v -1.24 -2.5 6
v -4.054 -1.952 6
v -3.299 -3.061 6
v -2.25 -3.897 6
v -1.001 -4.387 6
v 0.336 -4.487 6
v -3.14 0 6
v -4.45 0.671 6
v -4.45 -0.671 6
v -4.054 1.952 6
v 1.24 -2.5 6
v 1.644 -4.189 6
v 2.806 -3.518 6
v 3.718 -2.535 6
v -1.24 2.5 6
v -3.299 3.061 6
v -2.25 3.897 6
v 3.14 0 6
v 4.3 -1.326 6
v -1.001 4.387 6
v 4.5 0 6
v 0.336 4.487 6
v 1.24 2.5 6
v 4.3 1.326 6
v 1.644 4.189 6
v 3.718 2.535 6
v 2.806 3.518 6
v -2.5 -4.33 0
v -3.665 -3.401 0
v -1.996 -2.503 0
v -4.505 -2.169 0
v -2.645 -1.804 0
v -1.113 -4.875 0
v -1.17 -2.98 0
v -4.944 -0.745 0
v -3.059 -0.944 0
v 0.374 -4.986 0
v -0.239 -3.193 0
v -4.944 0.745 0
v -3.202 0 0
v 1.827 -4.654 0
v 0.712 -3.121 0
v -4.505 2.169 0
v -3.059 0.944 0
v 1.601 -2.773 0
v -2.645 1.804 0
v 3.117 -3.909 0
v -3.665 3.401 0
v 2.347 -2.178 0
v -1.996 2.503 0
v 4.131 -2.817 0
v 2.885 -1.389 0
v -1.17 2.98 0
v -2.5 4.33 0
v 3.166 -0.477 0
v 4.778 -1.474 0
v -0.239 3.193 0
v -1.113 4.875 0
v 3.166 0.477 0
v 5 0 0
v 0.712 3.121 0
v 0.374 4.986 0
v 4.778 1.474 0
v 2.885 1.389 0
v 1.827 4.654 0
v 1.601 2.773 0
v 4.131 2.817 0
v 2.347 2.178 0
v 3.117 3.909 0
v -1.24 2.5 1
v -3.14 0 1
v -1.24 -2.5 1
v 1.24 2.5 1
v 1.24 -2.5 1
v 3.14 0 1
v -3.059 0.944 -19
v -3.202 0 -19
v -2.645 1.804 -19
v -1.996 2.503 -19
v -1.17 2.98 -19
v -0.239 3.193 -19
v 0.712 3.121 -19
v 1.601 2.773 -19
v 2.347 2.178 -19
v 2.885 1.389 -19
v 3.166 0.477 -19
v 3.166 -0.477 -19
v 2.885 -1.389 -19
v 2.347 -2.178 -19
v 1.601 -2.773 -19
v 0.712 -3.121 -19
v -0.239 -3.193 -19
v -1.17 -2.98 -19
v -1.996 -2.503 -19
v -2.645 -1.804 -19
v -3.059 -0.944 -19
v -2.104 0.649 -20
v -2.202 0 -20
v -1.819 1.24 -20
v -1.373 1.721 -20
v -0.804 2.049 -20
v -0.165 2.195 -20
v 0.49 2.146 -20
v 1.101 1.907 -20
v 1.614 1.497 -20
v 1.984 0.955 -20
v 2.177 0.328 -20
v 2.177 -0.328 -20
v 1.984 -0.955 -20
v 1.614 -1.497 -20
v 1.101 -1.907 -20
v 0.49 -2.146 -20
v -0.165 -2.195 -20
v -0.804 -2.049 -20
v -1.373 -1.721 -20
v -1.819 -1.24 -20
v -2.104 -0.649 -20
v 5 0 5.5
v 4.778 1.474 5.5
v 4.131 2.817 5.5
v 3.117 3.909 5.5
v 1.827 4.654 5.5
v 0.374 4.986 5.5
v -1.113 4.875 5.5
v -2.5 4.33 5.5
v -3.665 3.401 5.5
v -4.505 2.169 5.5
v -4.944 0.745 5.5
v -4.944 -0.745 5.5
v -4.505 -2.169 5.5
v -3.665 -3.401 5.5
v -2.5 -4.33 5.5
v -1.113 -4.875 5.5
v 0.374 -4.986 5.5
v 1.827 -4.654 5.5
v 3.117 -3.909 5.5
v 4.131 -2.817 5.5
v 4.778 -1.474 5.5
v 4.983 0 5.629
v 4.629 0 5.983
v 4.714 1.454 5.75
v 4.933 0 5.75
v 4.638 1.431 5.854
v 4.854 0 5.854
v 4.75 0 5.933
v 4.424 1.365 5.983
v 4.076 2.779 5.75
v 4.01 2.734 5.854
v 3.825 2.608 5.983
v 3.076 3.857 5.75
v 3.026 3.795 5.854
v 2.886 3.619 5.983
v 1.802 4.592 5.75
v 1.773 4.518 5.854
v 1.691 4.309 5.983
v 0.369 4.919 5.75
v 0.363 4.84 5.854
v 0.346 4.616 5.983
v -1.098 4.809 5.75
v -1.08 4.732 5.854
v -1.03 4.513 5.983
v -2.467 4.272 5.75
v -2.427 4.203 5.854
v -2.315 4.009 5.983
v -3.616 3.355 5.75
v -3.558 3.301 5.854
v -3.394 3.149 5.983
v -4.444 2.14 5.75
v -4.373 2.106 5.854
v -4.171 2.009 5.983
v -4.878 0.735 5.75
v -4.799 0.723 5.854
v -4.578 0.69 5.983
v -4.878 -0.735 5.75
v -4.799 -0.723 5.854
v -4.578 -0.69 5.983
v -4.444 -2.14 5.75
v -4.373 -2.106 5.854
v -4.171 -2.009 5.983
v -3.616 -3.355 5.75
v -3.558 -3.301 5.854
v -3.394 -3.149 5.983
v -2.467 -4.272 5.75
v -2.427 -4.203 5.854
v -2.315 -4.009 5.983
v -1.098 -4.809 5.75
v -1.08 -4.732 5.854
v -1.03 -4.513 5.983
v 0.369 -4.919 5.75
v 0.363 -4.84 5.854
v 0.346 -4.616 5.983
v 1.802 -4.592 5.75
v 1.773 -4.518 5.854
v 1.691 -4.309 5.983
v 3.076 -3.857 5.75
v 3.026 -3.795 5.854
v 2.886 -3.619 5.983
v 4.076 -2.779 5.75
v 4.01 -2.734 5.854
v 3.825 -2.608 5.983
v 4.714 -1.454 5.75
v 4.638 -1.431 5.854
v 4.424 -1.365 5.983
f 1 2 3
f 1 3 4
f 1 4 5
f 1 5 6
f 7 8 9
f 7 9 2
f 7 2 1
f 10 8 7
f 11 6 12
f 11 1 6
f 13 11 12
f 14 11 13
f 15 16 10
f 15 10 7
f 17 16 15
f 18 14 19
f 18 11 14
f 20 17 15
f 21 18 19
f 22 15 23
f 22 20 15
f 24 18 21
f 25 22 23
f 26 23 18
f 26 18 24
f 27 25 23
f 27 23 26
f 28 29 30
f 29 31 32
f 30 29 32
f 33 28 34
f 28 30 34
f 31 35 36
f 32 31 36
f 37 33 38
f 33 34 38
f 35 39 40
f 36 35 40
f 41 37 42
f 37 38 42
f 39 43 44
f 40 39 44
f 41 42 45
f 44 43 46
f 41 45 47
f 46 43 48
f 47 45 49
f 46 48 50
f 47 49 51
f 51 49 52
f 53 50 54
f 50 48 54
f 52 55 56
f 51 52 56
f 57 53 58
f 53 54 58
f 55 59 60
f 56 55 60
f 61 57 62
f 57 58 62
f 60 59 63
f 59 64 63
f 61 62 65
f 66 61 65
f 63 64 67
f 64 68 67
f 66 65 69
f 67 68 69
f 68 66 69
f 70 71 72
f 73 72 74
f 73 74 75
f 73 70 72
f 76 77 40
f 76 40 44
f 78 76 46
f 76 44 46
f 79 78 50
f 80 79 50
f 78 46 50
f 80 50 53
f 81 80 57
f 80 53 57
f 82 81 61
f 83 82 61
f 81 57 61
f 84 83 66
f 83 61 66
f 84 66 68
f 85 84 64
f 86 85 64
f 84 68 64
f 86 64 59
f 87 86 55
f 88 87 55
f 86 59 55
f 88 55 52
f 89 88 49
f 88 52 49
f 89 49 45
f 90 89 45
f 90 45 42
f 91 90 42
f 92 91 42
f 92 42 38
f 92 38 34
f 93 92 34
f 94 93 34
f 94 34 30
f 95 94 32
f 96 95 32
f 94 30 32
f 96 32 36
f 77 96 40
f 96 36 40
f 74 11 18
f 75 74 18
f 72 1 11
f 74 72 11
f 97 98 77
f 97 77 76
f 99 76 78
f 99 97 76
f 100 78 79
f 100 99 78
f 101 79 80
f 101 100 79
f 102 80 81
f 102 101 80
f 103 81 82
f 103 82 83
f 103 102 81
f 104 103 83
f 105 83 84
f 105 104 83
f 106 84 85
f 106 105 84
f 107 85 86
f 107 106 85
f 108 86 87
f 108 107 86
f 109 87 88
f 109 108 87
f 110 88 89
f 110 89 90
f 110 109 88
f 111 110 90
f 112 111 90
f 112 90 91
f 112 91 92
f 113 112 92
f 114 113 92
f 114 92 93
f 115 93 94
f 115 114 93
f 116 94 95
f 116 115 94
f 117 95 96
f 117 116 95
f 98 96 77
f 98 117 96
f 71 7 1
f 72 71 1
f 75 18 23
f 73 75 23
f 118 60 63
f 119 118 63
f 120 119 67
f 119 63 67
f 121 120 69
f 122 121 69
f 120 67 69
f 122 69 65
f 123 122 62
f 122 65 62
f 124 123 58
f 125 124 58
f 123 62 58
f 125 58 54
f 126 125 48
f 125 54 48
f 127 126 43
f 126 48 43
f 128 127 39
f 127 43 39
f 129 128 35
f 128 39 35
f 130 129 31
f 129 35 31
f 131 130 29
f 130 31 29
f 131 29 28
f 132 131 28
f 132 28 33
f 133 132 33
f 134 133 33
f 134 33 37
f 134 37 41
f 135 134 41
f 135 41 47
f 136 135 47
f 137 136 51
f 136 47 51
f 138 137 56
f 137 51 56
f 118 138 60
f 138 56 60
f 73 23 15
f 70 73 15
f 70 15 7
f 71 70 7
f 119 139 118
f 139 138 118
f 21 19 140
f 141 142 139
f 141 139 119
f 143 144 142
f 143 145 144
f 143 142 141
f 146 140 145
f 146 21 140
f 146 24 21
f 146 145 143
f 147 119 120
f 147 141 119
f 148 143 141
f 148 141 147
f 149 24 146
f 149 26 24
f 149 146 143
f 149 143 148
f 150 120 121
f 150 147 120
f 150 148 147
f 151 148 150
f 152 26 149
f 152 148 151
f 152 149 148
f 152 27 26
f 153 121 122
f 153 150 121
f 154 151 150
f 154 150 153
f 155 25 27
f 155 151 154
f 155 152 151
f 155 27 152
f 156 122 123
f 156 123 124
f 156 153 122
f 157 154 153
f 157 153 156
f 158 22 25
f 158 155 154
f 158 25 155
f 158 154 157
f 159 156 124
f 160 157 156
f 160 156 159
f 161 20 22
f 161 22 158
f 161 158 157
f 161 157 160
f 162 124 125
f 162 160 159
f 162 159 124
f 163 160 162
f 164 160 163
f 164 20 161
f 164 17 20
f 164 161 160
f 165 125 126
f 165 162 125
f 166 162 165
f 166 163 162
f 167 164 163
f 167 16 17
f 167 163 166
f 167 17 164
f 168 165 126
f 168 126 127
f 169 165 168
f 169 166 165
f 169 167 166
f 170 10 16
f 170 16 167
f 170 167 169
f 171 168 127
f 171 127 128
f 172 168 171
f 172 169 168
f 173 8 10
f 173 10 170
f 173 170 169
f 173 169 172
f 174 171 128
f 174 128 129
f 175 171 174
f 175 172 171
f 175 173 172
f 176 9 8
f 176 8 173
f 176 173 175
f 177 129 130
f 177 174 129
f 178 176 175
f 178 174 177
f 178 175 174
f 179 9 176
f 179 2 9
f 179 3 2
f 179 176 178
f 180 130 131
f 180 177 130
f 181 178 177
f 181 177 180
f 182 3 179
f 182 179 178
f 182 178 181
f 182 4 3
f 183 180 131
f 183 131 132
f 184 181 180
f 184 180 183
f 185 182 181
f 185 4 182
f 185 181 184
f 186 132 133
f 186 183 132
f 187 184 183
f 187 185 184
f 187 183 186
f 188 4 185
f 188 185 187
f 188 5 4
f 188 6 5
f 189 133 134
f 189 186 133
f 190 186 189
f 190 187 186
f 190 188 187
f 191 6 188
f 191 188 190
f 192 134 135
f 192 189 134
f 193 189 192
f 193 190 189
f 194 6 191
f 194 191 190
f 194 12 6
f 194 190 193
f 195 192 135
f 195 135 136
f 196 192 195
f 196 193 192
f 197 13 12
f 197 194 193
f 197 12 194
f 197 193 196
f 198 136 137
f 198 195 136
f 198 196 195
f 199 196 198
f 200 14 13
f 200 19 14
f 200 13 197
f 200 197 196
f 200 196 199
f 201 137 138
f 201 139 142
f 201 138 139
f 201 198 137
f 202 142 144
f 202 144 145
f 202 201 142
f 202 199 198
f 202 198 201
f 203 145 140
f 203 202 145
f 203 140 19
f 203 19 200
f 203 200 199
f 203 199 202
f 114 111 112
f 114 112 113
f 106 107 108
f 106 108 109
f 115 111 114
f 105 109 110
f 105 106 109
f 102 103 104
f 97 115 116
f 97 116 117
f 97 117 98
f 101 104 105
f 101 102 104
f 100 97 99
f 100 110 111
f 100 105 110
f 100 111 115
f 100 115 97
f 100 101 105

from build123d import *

# Parameters (mm, degrees)
ESQUISSE1_R             = 5
BASE_EXTRUSION_DEPTH    = 6
ESQUISSE2_R             = 3.201580403
BOSS_EXTRU_1_DEPTH      = 20
ENL_V_MAT_EXTRU_1_DEPTH = 5
CONG_1_R                = 0.5
CHANFREIN1_SIZE         = 1


with BuildPart() as part:
    # Esquisse1 → Base-Extrusion (new body)
    with BuildSketch(Plane.XY):
        Circle(ESQUISSE1_R)
    extrude(amount=BASE_EXTRUSION_DEPTH)

    # Esquisse2 → Boss.-Extru.1 (add)
    with BuildSketch(Plane(origin=(0, 0, 0), x_dir=(-1, 0, 0), z_dir=(0, 0, -1))):
        Circle(ESQUISSE2_R)
    extrude(amount=BOSS_EXTRU_1_DEPTH)

    # Esquisse3 → Enlèv. mat.-Extru.1 (cut)
    with BuildSketch(Plane.XY.offset(6)):
        Polygon((3.140063694, 0), (1.240063694, 2.5), (-1.240063694, 2.5), (-3.140063694, 0), (-1.240063694, -2.5), (1.240063694, -2.5), align=None)
    extrude(amount=-ENL_V_MAT_EXTRU_1_DEPTH, mode=Mode.SUBTRACT)

    # Congé1
    cong_1_edges = [part.edges().sort_by_distance(p)[0] for p in [
        (-5, 0, 6),
    ]]
    fillet(cong_1_edges, radius=CONG_1_R)

    # Chanfrein1
    chanfrein1_edges = [part.edges().sort_by_distance(p)[0] for p in [
        (3.201580403, 0, -20),
    ]]
    chamfer(chanfrein1_edges, length=CHANFREIN1_SIZE)


solid = part.part
